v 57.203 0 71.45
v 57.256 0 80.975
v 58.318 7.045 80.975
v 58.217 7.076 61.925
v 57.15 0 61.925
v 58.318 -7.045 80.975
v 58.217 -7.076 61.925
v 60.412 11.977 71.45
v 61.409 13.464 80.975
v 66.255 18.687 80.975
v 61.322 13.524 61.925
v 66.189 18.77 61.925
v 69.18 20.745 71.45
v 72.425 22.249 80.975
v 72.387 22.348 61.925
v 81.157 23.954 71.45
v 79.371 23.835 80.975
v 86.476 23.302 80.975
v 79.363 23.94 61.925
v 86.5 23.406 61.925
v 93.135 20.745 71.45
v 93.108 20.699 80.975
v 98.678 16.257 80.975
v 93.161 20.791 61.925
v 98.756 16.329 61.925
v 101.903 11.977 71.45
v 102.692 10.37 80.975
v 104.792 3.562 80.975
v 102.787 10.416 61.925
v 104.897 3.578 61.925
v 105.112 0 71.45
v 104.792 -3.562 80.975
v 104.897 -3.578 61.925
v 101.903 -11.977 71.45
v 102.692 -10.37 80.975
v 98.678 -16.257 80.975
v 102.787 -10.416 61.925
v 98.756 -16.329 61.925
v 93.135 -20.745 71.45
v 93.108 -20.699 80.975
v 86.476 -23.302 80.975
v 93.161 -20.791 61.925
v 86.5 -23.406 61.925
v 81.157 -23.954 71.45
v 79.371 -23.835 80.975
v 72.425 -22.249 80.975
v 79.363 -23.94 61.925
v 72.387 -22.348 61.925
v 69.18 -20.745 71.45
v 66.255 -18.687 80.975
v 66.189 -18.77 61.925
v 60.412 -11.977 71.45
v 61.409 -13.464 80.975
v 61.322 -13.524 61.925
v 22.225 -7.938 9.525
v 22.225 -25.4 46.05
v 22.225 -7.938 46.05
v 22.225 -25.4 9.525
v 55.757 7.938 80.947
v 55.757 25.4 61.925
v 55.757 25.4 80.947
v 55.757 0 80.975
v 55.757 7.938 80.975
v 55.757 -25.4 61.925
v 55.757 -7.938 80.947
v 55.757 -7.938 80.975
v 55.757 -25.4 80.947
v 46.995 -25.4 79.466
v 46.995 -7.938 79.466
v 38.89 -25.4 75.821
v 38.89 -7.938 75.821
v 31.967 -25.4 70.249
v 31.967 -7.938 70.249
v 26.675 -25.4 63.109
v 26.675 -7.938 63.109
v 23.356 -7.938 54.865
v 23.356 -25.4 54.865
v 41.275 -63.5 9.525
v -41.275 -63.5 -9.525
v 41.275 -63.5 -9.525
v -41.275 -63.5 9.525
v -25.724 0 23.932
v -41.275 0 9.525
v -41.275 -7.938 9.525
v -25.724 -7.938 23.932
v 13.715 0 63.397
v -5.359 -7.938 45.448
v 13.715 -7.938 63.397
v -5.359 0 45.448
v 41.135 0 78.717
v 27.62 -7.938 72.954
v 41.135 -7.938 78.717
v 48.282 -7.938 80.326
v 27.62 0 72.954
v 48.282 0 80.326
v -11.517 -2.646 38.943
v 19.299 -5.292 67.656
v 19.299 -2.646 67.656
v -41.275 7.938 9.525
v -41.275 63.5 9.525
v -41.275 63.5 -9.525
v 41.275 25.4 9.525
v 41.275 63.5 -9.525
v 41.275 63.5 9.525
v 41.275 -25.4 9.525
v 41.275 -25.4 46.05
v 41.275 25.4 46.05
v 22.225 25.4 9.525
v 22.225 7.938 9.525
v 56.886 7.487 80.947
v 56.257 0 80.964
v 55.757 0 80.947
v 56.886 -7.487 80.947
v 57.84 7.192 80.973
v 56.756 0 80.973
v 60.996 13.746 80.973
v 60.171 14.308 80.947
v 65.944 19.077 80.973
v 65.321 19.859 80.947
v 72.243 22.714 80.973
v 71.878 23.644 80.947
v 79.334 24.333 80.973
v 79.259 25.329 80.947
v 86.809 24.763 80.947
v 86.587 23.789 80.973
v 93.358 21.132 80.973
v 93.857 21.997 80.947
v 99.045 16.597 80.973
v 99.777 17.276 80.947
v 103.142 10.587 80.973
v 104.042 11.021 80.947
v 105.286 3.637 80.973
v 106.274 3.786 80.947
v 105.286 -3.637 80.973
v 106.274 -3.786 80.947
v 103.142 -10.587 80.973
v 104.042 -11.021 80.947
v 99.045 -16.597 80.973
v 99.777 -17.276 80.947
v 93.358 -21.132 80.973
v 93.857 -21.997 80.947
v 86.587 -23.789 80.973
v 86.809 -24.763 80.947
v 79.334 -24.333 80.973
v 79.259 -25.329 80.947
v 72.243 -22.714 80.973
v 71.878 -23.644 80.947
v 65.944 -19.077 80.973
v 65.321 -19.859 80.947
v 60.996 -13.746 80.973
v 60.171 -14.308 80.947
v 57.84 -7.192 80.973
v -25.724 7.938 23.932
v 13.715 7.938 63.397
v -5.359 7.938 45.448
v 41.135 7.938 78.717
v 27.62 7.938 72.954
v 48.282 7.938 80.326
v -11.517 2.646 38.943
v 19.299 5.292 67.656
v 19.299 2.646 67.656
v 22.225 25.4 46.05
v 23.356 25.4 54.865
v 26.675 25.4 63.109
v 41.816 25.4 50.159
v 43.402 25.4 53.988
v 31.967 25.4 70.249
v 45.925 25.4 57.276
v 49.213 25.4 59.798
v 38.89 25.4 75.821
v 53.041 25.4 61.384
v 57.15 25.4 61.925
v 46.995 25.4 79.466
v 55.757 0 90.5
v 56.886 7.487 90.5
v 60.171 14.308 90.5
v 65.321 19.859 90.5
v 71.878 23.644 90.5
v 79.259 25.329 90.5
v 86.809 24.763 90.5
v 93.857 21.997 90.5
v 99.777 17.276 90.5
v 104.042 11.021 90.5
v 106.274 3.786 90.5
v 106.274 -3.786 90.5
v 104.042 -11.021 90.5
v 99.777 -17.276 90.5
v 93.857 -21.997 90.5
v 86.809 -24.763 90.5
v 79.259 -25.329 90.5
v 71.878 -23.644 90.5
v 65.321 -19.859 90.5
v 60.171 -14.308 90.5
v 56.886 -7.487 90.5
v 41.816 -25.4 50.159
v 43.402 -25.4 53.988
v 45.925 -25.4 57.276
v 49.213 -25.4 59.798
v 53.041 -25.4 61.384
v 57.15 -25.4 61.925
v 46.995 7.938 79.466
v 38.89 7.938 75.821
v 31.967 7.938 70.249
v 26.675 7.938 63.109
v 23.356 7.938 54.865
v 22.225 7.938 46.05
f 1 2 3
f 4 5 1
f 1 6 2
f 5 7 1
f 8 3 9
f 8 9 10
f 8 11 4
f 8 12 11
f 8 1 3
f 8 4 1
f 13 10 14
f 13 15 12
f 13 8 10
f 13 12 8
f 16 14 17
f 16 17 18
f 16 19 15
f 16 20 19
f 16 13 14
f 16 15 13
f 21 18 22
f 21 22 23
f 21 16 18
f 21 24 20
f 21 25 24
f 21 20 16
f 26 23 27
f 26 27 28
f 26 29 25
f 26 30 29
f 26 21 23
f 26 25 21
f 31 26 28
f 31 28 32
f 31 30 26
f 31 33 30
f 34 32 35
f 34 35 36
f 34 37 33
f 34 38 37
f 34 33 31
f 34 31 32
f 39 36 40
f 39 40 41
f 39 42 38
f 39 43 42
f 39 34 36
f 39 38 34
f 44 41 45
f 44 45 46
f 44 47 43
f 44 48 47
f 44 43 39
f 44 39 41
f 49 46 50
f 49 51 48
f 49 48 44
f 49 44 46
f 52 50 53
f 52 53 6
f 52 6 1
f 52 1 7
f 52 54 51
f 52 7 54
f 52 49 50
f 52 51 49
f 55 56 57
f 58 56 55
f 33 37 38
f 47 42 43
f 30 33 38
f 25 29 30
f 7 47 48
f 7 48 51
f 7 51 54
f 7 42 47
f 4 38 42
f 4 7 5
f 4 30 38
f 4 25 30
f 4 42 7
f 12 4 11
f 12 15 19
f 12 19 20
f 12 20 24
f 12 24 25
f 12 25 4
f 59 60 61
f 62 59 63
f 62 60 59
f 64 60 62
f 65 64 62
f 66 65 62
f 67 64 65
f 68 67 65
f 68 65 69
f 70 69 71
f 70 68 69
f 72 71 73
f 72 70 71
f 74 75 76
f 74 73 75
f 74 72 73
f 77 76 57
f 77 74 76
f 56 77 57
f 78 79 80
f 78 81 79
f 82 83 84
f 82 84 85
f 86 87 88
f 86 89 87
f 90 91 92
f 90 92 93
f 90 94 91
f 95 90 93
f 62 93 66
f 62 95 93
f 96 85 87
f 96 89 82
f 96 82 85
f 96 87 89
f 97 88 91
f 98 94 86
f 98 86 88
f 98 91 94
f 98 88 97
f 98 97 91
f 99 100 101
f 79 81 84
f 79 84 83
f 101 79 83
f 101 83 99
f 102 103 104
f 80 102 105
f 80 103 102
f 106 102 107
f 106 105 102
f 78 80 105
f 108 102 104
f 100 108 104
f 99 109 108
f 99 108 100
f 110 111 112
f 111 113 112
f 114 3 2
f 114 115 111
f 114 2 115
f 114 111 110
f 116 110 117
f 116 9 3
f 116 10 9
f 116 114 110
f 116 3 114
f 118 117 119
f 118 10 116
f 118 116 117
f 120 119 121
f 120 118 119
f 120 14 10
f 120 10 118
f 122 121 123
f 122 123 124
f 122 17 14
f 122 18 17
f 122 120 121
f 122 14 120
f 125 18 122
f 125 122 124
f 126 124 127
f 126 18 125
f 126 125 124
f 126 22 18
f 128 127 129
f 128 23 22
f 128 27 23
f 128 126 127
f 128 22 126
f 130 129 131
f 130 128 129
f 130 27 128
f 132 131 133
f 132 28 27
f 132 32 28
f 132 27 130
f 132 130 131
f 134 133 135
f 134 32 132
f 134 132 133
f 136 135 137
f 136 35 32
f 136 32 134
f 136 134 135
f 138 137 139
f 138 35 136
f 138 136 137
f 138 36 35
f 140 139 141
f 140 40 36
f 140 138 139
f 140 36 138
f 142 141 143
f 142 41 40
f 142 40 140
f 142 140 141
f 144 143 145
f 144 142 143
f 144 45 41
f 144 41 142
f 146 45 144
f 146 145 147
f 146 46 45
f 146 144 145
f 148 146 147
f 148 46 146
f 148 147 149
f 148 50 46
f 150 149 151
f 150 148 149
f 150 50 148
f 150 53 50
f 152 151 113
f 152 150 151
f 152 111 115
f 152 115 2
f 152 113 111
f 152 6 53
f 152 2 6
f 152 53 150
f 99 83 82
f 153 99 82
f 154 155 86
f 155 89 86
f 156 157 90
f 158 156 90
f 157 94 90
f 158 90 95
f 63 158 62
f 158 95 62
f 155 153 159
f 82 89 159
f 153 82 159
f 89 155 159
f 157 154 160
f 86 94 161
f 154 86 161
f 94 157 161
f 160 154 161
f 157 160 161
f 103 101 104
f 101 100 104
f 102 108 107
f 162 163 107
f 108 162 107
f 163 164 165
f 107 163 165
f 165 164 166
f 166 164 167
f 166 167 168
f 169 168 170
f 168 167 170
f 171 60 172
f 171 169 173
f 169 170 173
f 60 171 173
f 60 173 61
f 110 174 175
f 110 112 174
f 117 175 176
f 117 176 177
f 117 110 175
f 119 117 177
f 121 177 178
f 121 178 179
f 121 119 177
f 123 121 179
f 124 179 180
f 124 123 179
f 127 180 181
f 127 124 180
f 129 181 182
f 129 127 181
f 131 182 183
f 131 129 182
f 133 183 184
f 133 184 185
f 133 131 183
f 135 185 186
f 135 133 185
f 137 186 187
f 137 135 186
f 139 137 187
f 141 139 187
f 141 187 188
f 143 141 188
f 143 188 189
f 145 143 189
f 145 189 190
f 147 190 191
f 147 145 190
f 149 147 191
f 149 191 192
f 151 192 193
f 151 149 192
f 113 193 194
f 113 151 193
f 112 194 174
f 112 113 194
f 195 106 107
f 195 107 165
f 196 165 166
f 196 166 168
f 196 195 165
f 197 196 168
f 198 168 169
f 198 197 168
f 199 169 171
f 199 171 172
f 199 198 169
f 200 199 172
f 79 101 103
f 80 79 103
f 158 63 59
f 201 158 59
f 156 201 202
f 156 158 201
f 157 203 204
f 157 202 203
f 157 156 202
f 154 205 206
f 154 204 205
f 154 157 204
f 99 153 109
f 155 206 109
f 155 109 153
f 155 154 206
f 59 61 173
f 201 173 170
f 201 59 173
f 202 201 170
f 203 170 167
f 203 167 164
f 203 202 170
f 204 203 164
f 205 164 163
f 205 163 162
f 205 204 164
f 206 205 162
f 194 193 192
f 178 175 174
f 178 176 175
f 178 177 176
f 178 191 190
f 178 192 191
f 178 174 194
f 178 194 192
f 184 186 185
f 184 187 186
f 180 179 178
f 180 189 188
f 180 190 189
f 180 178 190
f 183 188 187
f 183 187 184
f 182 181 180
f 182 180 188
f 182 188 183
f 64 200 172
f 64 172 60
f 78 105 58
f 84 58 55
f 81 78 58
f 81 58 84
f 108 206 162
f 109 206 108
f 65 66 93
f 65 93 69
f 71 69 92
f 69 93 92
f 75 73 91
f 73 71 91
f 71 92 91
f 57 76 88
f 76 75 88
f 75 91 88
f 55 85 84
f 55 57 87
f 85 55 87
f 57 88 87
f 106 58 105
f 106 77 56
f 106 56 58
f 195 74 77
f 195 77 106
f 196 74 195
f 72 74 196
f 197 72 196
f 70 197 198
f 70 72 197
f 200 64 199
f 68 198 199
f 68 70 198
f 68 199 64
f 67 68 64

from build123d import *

# Parameters (mm, degrees)
F1_DEPTH = 63.5
F2_DEPTH = 25.4
F3_DEPTH = 7.9375


with BuildPart() as f1:
    # F0 (on Front) → F1 (new body, symmetric)
    with BuildSketch(Plane.XZ):
        Polygon((-41.275, -9.525), (41.275, -9.525), (41.275, 9.525), (22.224999, 9.525), (-41.275, 9.525), align=None)
    extrude(amount=F1_DEPTH, both=True)

    # F0 (on Front) → F2 (join, symmetric)
    with BuildSketch(Plane.XZ):
        with BuildLine():
            Line((22.224999, 9.525), (41.275, 9.525))
            Line((41.275, 9.525), (41.275, 46.0502))
            ThreePointArc((41.275, 46.0502), (45.92468, 57.27552), (57.15, 61.9252))
            Line((57.15, 61.9252), (55.757451, 61.9252))
            Line((55.757451, 61.9252), (55.757451, 80.947428))
            ThreePointArc((55.757451, 80.947428), (31.966767, 70.248557), (22.224999, 46.0502))
            Line((22.224999, 46.0502), (22.224999, 9.525))
        make_face()
    extrude(amount=F2_DEPTH, both=True)

    # F0 (on Front) → F3 (join, symmetric)
    with BuildSketch(Plane.XZ):
        with BuildLine():
            add(Edge.make_bspline(
                [(-41.275, 9.525), (-10.519324, 34.400629), (14.951362, 80.247904), (55.757451, 80.97504)],
                knots=[0, 0, 0, 0, 120.500643, 120.500643, 120.500643, 120.500643], degree=3))
            Line((-41.275, 9.525), (22.224999, 9.525))
            Line((22.224999, 9.525), (22.224999, 46.0502))
            ThreePointArc((22.224999, 46.0502), (31.966767, 70.248557), (55.757451, 80.947428))
            Line((55.757451, 80.947428), (55.757451, 80.97504))
        make_face()
    extrude(amount=F3_DEPTH, both=True)


with BuildPart() as f4:
    # F0 (on Front) → F4 (revolve)
    with BuildSketch(Plane.XZ):
        with BuildLine():
            Line((55.757451, 90.5002), (55.757451, 80.97504))
            Line((55.757451, 80.97504), (55.757451, 80.947428))
            ThreePointArc((55.757451, 80.947428), (56.506623, 80.969275), (57.256091, 80.97504))
            Line((57.256091, 80.97504), (57.15, 61.9252))
            Line((57.15, 61.9252), (81.157451, 61.9252))
            Line((81.157451, 61.9252), (81.157451, 90.5002))
            Line((81.157451, 90.5002), (55.757451, 90.5002))
        make_face()
    revolve(axis=Axis((81.157451, 0, 76.2127), (0, 0, -1)))


solid = Compound([f1.part, f4.part])
